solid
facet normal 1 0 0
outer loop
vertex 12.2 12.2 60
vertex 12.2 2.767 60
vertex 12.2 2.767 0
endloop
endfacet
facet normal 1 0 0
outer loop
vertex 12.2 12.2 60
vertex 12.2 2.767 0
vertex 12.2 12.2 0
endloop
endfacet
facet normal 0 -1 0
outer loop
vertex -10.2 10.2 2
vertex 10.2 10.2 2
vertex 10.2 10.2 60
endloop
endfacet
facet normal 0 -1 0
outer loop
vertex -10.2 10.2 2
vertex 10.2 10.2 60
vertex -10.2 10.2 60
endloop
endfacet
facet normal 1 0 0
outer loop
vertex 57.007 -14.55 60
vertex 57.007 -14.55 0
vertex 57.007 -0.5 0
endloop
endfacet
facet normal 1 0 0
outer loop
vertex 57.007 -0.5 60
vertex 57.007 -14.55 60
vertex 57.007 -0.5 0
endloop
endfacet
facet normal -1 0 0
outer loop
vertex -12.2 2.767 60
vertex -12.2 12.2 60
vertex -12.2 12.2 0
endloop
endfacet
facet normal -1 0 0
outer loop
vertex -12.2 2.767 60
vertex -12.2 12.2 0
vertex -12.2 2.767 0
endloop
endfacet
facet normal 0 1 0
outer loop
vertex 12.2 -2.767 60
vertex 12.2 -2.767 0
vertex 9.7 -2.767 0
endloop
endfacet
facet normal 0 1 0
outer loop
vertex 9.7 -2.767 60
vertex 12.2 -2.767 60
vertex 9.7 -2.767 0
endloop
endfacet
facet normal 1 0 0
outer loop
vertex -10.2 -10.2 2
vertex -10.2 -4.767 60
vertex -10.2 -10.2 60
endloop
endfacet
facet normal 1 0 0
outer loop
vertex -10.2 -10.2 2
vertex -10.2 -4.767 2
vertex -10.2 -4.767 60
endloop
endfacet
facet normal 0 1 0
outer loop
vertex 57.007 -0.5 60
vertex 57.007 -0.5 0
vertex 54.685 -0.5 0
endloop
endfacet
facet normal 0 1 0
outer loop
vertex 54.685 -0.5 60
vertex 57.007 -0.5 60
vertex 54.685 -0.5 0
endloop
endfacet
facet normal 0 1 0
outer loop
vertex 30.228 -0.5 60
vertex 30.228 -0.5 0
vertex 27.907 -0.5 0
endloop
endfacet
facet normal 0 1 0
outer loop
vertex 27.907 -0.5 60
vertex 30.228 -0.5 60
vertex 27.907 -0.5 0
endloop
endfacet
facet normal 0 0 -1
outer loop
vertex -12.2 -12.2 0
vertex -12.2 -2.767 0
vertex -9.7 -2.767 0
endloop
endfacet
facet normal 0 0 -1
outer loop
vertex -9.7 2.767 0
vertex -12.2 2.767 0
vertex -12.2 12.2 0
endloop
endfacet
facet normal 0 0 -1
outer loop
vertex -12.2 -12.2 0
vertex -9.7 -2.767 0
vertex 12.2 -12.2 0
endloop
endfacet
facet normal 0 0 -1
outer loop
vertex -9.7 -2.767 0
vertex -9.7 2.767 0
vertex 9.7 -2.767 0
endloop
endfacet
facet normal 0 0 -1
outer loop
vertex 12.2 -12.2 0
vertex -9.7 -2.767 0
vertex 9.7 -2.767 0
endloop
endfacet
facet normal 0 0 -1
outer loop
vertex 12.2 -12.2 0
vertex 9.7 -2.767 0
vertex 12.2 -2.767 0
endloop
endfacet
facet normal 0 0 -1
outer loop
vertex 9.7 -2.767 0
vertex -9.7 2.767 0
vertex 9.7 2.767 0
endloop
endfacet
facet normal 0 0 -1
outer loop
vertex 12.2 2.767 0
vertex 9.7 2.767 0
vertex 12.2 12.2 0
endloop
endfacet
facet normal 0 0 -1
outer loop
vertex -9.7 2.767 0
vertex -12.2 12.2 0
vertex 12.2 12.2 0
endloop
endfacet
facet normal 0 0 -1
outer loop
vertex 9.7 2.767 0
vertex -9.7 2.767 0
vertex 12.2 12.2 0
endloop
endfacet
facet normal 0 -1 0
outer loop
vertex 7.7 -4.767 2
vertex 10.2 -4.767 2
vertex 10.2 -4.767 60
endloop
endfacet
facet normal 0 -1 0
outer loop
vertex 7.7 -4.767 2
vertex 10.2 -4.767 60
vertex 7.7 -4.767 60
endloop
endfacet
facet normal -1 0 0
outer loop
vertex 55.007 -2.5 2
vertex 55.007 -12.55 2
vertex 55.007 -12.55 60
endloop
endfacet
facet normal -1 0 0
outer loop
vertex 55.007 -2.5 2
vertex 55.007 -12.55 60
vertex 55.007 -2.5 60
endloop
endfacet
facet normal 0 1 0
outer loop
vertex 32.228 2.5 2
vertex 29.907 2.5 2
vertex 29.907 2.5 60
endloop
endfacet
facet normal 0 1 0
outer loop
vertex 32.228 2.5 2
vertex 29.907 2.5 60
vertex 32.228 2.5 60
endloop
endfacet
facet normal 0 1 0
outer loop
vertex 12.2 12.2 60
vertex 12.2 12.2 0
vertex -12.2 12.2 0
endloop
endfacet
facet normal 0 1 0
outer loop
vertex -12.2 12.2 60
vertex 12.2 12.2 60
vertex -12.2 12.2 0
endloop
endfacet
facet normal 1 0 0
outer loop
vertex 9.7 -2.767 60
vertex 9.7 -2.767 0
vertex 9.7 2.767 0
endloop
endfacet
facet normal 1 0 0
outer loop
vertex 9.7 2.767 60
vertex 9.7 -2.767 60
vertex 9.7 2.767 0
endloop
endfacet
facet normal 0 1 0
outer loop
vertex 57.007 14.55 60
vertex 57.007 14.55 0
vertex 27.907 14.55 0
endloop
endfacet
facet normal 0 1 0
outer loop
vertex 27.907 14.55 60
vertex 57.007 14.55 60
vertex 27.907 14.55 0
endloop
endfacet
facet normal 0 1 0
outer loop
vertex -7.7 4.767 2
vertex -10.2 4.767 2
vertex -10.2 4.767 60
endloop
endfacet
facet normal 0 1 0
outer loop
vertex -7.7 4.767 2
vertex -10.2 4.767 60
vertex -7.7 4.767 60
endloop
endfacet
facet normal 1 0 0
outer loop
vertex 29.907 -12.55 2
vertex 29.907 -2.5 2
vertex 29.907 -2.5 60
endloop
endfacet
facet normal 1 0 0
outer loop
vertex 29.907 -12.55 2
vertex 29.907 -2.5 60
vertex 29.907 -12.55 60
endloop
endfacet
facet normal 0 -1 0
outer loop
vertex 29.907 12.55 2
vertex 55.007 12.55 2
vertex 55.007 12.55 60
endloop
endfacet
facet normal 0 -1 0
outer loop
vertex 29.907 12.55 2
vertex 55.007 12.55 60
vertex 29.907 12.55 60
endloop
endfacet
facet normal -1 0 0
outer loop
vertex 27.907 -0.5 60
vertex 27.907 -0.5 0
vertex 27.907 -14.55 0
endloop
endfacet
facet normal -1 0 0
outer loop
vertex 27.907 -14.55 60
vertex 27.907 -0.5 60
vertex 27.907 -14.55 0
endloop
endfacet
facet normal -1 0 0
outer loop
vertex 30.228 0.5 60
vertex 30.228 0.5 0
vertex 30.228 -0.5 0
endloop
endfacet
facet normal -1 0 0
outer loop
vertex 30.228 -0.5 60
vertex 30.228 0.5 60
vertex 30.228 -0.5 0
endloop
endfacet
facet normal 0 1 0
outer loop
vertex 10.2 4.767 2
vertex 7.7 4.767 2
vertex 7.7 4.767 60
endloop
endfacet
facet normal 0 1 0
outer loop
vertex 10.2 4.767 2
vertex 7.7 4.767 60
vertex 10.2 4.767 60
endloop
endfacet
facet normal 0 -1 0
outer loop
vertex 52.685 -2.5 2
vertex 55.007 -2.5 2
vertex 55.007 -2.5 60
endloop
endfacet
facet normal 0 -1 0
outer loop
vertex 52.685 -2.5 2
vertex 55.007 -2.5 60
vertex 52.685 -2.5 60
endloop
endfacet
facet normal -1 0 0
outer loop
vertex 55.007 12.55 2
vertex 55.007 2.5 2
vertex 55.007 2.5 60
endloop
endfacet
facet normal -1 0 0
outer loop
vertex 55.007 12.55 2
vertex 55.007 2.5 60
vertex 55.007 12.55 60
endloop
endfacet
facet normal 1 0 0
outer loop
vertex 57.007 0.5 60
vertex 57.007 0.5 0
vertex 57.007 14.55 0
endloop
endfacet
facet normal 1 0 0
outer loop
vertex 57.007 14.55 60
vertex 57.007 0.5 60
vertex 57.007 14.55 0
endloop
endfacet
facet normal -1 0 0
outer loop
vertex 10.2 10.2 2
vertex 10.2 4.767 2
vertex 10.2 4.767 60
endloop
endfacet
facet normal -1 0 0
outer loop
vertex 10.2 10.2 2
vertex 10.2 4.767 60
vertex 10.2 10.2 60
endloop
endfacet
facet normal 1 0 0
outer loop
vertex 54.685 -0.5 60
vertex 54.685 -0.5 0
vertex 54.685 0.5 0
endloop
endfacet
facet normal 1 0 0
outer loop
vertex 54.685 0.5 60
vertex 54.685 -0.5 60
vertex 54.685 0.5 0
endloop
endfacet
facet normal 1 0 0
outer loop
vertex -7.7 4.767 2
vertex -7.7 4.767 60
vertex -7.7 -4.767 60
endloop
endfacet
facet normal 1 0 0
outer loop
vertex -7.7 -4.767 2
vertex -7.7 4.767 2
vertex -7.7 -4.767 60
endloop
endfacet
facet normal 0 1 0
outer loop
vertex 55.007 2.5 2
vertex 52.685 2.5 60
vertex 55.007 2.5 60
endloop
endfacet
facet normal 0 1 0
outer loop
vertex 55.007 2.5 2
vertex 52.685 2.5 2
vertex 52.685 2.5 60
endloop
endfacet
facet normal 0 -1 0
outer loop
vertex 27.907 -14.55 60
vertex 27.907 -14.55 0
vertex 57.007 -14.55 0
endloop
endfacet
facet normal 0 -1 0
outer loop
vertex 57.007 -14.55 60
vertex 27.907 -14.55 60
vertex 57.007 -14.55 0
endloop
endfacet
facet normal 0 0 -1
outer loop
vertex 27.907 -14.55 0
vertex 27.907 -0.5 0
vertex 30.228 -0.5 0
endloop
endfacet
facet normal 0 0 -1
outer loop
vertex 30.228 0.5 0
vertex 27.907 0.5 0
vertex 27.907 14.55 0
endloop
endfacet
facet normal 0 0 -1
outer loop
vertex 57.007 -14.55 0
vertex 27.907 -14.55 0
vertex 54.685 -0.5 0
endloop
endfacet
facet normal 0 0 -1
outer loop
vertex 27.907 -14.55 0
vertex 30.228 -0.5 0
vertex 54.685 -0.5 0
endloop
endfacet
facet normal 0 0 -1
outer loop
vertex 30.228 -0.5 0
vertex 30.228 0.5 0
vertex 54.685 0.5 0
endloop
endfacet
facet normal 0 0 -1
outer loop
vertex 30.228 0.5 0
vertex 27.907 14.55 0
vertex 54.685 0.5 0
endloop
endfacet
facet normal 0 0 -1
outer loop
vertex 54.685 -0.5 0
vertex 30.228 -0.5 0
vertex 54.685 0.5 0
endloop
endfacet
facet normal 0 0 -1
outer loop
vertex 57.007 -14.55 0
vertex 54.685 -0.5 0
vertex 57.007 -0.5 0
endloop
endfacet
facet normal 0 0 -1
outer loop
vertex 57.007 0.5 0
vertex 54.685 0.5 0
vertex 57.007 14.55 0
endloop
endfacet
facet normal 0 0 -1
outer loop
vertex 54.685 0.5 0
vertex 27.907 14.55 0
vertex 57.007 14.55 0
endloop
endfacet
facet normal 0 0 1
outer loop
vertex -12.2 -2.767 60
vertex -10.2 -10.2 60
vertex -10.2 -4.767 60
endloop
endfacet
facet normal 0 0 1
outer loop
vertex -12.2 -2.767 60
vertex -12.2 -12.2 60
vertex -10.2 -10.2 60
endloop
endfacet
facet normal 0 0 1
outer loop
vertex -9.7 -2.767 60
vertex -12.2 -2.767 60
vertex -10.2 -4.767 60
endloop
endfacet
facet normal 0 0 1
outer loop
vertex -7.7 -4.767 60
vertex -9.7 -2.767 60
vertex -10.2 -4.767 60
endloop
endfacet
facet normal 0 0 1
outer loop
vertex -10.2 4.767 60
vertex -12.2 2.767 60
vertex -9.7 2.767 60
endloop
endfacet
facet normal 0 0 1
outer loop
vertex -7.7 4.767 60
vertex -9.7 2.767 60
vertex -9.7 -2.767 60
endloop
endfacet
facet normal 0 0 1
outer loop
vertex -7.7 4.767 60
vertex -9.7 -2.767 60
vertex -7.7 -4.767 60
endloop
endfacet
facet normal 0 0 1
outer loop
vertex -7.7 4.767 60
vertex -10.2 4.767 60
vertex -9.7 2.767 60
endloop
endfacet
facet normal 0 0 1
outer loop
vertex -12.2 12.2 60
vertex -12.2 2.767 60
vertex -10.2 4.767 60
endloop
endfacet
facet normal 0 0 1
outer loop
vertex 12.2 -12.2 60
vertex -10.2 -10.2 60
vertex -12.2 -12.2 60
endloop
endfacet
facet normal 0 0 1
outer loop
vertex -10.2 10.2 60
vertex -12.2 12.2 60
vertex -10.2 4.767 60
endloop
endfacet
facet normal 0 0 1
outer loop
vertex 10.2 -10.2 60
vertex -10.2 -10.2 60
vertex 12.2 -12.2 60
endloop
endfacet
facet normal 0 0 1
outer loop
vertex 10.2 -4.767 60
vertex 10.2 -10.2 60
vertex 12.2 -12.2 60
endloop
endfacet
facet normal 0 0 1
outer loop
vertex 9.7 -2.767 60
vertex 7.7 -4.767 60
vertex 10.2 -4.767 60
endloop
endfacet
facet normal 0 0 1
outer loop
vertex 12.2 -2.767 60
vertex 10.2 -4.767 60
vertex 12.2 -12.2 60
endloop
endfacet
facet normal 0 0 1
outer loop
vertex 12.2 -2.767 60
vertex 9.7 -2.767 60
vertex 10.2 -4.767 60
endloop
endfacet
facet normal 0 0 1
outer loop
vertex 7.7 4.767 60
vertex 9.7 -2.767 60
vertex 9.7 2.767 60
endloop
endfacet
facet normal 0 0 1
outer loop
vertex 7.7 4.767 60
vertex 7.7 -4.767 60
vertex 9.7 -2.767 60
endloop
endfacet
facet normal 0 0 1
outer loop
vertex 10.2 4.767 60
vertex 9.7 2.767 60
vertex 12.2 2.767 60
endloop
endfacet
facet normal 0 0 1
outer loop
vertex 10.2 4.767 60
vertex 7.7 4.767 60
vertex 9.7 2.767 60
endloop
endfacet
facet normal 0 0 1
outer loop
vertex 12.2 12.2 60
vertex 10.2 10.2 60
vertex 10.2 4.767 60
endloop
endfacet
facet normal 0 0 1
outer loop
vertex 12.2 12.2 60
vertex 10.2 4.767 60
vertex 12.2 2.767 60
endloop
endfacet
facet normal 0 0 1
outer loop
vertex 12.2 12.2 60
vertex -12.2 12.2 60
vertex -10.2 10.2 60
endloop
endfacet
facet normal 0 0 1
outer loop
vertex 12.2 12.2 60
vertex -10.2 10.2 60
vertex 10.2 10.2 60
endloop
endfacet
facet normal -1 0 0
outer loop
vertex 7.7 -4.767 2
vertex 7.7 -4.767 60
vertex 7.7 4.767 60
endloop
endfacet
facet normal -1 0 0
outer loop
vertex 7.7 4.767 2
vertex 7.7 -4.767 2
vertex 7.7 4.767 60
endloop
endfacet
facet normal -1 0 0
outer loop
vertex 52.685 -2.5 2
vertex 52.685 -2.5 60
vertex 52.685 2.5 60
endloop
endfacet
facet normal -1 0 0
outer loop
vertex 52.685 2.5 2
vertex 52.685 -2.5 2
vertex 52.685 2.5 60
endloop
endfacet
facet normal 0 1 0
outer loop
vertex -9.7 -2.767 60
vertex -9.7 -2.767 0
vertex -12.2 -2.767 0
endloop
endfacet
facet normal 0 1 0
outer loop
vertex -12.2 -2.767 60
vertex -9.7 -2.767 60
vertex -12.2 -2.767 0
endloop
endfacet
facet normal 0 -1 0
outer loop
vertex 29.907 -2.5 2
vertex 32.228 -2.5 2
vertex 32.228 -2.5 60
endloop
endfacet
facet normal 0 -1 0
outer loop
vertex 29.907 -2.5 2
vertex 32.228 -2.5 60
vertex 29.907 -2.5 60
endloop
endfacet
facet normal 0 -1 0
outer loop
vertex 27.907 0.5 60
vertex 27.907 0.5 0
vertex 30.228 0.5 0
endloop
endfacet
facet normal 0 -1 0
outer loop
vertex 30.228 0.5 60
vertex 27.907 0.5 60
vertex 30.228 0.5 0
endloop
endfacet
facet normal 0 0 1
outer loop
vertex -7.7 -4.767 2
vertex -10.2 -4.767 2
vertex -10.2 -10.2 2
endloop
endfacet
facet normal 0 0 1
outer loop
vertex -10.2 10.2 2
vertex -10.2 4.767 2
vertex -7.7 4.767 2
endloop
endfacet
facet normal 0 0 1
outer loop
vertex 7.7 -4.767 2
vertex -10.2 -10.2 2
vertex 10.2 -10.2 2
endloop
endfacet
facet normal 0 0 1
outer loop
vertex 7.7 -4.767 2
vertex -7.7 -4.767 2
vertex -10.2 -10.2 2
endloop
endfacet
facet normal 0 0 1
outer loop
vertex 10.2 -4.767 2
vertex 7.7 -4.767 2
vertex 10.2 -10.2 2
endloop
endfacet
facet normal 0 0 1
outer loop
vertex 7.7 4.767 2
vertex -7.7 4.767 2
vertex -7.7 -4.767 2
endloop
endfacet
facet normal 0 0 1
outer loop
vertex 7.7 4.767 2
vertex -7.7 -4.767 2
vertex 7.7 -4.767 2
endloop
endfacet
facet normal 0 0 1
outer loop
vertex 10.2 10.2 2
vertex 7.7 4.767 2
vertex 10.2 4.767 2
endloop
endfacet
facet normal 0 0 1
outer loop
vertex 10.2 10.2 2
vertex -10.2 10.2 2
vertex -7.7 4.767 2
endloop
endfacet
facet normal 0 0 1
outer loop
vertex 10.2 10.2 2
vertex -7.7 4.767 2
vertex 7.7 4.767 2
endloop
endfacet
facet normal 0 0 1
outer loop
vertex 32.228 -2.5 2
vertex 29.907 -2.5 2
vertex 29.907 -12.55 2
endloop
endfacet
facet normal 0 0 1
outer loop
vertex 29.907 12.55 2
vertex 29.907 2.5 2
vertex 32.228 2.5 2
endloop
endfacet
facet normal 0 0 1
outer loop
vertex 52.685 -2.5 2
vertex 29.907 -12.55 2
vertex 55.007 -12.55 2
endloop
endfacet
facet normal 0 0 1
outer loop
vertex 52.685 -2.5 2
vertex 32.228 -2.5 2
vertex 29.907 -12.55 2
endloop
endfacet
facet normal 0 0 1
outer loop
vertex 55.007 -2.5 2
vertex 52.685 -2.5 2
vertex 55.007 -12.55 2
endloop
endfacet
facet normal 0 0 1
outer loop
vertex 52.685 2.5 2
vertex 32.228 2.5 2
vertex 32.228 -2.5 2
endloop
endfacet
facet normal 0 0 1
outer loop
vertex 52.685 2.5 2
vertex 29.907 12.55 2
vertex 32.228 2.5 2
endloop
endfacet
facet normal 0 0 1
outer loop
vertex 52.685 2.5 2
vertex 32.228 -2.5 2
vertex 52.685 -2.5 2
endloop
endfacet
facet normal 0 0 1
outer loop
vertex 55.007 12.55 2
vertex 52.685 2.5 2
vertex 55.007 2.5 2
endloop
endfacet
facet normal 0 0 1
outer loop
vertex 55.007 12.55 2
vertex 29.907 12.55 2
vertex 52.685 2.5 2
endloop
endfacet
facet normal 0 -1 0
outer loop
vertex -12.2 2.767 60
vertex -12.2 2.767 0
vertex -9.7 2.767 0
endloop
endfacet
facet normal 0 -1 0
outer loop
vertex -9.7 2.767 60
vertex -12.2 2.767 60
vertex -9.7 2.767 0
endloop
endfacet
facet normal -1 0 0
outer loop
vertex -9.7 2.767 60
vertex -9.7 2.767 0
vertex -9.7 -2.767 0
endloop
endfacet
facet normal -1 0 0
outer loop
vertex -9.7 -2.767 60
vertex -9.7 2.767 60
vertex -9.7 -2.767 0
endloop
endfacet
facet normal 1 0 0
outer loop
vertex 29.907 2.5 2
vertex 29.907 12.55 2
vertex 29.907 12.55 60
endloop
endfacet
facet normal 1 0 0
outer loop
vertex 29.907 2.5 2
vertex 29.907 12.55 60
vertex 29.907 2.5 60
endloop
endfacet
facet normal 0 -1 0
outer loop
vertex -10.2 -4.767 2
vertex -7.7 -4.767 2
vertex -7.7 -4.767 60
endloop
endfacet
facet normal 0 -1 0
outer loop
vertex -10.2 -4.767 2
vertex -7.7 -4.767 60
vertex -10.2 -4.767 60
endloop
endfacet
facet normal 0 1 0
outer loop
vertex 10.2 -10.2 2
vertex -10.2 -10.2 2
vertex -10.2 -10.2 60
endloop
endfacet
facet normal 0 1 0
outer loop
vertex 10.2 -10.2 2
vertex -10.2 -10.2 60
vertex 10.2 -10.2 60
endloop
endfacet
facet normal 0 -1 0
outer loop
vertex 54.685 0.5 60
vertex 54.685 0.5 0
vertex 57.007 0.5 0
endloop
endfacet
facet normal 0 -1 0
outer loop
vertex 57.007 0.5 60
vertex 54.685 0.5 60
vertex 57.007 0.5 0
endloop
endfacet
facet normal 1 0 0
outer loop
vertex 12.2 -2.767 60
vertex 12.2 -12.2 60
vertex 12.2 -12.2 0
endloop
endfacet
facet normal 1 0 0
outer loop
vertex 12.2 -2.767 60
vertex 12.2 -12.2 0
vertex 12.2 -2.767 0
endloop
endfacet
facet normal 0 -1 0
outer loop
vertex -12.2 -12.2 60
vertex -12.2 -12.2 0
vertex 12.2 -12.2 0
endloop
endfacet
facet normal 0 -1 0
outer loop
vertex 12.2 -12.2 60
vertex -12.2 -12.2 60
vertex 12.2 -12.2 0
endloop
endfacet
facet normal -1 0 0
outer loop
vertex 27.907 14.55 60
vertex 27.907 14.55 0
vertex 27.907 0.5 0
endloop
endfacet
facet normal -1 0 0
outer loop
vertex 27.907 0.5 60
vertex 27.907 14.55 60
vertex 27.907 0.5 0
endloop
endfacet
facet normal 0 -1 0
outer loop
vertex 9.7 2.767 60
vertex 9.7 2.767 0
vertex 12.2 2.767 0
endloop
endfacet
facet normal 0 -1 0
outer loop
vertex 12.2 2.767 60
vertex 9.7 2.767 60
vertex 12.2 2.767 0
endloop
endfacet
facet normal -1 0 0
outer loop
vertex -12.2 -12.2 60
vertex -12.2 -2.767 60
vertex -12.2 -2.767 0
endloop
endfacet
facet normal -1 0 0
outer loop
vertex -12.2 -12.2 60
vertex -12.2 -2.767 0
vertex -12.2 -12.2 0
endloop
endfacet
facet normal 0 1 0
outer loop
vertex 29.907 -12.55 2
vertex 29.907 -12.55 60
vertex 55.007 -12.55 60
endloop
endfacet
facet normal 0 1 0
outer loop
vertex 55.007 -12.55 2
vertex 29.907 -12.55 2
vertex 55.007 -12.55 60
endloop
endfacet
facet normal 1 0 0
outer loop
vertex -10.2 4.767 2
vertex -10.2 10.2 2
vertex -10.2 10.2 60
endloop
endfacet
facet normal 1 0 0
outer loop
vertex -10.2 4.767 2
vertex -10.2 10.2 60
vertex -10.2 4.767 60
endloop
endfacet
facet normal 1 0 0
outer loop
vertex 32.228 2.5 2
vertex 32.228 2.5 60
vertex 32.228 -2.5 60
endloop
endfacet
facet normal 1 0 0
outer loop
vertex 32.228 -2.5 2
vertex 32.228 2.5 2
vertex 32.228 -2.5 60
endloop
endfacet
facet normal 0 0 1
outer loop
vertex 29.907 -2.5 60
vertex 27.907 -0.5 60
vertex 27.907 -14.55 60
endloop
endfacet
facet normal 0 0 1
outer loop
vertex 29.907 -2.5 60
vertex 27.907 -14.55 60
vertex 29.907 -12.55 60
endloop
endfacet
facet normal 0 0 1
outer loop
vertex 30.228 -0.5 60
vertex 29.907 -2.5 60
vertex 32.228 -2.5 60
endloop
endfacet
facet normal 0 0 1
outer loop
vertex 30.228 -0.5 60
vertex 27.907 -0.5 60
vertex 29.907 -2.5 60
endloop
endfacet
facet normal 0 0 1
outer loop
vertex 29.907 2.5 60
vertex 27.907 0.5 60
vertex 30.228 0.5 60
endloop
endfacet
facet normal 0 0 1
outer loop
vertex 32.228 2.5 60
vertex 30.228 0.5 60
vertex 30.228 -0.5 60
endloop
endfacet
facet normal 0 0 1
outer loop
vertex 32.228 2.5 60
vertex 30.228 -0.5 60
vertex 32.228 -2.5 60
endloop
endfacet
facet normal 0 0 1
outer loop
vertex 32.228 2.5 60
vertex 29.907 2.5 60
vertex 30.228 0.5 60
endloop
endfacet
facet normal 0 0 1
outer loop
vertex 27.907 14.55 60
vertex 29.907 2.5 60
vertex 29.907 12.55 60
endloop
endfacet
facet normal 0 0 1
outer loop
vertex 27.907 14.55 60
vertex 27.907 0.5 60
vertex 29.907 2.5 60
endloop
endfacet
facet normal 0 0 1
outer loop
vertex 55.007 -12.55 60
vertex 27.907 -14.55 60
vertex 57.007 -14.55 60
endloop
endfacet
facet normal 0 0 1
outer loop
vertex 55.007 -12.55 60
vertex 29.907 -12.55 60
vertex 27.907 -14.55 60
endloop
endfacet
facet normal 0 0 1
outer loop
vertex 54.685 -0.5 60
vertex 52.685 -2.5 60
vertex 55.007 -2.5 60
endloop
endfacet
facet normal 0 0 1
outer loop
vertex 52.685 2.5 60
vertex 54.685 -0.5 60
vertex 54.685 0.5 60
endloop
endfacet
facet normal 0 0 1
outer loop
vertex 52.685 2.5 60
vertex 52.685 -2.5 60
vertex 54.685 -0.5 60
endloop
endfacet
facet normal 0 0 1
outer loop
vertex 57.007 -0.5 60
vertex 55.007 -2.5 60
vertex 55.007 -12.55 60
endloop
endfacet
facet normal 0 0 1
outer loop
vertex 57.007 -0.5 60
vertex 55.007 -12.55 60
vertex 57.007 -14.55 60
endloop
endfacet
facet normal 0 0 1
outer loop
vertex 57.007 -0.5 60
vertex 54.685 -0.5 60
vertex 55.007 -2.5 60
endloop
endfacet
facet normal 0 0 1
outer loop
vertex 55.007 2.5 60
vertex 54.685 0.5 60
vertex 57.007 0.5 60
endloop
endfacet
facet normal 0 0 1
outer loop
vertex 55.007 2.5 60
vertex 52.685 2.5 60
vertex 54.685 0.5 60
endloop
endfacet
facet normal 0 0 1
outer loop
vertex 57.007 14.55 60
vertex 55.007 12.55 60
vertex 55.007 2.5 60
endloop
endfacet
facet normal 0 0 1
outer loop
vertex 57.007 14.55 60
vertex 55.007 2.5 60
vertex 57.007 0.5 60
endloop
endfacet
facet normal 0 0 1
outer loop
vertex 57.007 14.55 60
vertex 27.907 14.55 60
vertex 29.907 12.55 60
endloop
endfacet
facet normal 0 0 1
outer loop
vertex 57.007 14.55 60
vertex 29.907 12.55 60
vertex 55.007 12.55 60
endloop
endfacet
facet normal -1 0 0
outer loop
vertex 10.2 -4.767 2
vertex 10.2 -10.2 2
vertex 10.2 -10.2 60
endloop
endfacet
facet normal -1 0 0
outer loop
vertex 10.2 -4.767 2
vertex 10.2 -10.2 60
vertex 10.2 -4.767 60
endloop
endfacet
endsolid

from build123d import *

# Parameters (mm, degrees)
F1_DEPTH = 60
F2_T     = -2
F2_2_T   = -2


with BuildPart() as f1:
    # F0 (on Top) → F1 (new body)
    with BuildSketch(Plane.XY):
        Polygon((-12.2, -12.2), (12.2, -12.2), (12.2, -2.7670562863), (9.7, -2.7670562863), (9.7, 2.7670562863), (12.2, 2.7670562863), (12.2, 12.2), (-12.2, 12.2), (-12.2, 2.7670562863), (-9.7, 2.7670562863), (-9.7, -2.7670562863), (-12.2, -2.7670562863), align=None)
    extrude(amount=F1_DEPTH)

    # F2
    f2_openings = [f1.faces().sort_by_distance(p)[0] for p in [
        (0, 0, 60),
    ]]
    offset(amount=F2_T, openings=f2_openings, kind=Kind.INTERSECTION)


with BuildPart() as f1b:
    # F0 (on Top) → F1, piece 2 (new body)
    with BuildSketch(Plane.XY):
        Polygon((57.0066343427, 0.5), (57.0066343427, 14.55), (27.9066343427, 14.55), (27.9066343427, 0.5), (30.2280262229, 0.5), (30.2280262229, -0.5), (27.9066343427, -0.5), (27.9066343427, -14.55), (57.0066343427, -14.55), (57.0066343427, -0.5), (54.6852424624, -0.5), (54.6852424624, 0.5), align=None)
    extrude(amount=F1_DEPTH)

    # F2#2
    f2_2_openings = [f1b.faces().sort_by_distance(p)[0] for p in [
        (42.456634, 0, 60),
    ]]
    offset(amount=F2_2_T, openings=f2_2_openings, kind=Kind.INTERSECTION)


solid = Compound([f1.part, f1b.part])
